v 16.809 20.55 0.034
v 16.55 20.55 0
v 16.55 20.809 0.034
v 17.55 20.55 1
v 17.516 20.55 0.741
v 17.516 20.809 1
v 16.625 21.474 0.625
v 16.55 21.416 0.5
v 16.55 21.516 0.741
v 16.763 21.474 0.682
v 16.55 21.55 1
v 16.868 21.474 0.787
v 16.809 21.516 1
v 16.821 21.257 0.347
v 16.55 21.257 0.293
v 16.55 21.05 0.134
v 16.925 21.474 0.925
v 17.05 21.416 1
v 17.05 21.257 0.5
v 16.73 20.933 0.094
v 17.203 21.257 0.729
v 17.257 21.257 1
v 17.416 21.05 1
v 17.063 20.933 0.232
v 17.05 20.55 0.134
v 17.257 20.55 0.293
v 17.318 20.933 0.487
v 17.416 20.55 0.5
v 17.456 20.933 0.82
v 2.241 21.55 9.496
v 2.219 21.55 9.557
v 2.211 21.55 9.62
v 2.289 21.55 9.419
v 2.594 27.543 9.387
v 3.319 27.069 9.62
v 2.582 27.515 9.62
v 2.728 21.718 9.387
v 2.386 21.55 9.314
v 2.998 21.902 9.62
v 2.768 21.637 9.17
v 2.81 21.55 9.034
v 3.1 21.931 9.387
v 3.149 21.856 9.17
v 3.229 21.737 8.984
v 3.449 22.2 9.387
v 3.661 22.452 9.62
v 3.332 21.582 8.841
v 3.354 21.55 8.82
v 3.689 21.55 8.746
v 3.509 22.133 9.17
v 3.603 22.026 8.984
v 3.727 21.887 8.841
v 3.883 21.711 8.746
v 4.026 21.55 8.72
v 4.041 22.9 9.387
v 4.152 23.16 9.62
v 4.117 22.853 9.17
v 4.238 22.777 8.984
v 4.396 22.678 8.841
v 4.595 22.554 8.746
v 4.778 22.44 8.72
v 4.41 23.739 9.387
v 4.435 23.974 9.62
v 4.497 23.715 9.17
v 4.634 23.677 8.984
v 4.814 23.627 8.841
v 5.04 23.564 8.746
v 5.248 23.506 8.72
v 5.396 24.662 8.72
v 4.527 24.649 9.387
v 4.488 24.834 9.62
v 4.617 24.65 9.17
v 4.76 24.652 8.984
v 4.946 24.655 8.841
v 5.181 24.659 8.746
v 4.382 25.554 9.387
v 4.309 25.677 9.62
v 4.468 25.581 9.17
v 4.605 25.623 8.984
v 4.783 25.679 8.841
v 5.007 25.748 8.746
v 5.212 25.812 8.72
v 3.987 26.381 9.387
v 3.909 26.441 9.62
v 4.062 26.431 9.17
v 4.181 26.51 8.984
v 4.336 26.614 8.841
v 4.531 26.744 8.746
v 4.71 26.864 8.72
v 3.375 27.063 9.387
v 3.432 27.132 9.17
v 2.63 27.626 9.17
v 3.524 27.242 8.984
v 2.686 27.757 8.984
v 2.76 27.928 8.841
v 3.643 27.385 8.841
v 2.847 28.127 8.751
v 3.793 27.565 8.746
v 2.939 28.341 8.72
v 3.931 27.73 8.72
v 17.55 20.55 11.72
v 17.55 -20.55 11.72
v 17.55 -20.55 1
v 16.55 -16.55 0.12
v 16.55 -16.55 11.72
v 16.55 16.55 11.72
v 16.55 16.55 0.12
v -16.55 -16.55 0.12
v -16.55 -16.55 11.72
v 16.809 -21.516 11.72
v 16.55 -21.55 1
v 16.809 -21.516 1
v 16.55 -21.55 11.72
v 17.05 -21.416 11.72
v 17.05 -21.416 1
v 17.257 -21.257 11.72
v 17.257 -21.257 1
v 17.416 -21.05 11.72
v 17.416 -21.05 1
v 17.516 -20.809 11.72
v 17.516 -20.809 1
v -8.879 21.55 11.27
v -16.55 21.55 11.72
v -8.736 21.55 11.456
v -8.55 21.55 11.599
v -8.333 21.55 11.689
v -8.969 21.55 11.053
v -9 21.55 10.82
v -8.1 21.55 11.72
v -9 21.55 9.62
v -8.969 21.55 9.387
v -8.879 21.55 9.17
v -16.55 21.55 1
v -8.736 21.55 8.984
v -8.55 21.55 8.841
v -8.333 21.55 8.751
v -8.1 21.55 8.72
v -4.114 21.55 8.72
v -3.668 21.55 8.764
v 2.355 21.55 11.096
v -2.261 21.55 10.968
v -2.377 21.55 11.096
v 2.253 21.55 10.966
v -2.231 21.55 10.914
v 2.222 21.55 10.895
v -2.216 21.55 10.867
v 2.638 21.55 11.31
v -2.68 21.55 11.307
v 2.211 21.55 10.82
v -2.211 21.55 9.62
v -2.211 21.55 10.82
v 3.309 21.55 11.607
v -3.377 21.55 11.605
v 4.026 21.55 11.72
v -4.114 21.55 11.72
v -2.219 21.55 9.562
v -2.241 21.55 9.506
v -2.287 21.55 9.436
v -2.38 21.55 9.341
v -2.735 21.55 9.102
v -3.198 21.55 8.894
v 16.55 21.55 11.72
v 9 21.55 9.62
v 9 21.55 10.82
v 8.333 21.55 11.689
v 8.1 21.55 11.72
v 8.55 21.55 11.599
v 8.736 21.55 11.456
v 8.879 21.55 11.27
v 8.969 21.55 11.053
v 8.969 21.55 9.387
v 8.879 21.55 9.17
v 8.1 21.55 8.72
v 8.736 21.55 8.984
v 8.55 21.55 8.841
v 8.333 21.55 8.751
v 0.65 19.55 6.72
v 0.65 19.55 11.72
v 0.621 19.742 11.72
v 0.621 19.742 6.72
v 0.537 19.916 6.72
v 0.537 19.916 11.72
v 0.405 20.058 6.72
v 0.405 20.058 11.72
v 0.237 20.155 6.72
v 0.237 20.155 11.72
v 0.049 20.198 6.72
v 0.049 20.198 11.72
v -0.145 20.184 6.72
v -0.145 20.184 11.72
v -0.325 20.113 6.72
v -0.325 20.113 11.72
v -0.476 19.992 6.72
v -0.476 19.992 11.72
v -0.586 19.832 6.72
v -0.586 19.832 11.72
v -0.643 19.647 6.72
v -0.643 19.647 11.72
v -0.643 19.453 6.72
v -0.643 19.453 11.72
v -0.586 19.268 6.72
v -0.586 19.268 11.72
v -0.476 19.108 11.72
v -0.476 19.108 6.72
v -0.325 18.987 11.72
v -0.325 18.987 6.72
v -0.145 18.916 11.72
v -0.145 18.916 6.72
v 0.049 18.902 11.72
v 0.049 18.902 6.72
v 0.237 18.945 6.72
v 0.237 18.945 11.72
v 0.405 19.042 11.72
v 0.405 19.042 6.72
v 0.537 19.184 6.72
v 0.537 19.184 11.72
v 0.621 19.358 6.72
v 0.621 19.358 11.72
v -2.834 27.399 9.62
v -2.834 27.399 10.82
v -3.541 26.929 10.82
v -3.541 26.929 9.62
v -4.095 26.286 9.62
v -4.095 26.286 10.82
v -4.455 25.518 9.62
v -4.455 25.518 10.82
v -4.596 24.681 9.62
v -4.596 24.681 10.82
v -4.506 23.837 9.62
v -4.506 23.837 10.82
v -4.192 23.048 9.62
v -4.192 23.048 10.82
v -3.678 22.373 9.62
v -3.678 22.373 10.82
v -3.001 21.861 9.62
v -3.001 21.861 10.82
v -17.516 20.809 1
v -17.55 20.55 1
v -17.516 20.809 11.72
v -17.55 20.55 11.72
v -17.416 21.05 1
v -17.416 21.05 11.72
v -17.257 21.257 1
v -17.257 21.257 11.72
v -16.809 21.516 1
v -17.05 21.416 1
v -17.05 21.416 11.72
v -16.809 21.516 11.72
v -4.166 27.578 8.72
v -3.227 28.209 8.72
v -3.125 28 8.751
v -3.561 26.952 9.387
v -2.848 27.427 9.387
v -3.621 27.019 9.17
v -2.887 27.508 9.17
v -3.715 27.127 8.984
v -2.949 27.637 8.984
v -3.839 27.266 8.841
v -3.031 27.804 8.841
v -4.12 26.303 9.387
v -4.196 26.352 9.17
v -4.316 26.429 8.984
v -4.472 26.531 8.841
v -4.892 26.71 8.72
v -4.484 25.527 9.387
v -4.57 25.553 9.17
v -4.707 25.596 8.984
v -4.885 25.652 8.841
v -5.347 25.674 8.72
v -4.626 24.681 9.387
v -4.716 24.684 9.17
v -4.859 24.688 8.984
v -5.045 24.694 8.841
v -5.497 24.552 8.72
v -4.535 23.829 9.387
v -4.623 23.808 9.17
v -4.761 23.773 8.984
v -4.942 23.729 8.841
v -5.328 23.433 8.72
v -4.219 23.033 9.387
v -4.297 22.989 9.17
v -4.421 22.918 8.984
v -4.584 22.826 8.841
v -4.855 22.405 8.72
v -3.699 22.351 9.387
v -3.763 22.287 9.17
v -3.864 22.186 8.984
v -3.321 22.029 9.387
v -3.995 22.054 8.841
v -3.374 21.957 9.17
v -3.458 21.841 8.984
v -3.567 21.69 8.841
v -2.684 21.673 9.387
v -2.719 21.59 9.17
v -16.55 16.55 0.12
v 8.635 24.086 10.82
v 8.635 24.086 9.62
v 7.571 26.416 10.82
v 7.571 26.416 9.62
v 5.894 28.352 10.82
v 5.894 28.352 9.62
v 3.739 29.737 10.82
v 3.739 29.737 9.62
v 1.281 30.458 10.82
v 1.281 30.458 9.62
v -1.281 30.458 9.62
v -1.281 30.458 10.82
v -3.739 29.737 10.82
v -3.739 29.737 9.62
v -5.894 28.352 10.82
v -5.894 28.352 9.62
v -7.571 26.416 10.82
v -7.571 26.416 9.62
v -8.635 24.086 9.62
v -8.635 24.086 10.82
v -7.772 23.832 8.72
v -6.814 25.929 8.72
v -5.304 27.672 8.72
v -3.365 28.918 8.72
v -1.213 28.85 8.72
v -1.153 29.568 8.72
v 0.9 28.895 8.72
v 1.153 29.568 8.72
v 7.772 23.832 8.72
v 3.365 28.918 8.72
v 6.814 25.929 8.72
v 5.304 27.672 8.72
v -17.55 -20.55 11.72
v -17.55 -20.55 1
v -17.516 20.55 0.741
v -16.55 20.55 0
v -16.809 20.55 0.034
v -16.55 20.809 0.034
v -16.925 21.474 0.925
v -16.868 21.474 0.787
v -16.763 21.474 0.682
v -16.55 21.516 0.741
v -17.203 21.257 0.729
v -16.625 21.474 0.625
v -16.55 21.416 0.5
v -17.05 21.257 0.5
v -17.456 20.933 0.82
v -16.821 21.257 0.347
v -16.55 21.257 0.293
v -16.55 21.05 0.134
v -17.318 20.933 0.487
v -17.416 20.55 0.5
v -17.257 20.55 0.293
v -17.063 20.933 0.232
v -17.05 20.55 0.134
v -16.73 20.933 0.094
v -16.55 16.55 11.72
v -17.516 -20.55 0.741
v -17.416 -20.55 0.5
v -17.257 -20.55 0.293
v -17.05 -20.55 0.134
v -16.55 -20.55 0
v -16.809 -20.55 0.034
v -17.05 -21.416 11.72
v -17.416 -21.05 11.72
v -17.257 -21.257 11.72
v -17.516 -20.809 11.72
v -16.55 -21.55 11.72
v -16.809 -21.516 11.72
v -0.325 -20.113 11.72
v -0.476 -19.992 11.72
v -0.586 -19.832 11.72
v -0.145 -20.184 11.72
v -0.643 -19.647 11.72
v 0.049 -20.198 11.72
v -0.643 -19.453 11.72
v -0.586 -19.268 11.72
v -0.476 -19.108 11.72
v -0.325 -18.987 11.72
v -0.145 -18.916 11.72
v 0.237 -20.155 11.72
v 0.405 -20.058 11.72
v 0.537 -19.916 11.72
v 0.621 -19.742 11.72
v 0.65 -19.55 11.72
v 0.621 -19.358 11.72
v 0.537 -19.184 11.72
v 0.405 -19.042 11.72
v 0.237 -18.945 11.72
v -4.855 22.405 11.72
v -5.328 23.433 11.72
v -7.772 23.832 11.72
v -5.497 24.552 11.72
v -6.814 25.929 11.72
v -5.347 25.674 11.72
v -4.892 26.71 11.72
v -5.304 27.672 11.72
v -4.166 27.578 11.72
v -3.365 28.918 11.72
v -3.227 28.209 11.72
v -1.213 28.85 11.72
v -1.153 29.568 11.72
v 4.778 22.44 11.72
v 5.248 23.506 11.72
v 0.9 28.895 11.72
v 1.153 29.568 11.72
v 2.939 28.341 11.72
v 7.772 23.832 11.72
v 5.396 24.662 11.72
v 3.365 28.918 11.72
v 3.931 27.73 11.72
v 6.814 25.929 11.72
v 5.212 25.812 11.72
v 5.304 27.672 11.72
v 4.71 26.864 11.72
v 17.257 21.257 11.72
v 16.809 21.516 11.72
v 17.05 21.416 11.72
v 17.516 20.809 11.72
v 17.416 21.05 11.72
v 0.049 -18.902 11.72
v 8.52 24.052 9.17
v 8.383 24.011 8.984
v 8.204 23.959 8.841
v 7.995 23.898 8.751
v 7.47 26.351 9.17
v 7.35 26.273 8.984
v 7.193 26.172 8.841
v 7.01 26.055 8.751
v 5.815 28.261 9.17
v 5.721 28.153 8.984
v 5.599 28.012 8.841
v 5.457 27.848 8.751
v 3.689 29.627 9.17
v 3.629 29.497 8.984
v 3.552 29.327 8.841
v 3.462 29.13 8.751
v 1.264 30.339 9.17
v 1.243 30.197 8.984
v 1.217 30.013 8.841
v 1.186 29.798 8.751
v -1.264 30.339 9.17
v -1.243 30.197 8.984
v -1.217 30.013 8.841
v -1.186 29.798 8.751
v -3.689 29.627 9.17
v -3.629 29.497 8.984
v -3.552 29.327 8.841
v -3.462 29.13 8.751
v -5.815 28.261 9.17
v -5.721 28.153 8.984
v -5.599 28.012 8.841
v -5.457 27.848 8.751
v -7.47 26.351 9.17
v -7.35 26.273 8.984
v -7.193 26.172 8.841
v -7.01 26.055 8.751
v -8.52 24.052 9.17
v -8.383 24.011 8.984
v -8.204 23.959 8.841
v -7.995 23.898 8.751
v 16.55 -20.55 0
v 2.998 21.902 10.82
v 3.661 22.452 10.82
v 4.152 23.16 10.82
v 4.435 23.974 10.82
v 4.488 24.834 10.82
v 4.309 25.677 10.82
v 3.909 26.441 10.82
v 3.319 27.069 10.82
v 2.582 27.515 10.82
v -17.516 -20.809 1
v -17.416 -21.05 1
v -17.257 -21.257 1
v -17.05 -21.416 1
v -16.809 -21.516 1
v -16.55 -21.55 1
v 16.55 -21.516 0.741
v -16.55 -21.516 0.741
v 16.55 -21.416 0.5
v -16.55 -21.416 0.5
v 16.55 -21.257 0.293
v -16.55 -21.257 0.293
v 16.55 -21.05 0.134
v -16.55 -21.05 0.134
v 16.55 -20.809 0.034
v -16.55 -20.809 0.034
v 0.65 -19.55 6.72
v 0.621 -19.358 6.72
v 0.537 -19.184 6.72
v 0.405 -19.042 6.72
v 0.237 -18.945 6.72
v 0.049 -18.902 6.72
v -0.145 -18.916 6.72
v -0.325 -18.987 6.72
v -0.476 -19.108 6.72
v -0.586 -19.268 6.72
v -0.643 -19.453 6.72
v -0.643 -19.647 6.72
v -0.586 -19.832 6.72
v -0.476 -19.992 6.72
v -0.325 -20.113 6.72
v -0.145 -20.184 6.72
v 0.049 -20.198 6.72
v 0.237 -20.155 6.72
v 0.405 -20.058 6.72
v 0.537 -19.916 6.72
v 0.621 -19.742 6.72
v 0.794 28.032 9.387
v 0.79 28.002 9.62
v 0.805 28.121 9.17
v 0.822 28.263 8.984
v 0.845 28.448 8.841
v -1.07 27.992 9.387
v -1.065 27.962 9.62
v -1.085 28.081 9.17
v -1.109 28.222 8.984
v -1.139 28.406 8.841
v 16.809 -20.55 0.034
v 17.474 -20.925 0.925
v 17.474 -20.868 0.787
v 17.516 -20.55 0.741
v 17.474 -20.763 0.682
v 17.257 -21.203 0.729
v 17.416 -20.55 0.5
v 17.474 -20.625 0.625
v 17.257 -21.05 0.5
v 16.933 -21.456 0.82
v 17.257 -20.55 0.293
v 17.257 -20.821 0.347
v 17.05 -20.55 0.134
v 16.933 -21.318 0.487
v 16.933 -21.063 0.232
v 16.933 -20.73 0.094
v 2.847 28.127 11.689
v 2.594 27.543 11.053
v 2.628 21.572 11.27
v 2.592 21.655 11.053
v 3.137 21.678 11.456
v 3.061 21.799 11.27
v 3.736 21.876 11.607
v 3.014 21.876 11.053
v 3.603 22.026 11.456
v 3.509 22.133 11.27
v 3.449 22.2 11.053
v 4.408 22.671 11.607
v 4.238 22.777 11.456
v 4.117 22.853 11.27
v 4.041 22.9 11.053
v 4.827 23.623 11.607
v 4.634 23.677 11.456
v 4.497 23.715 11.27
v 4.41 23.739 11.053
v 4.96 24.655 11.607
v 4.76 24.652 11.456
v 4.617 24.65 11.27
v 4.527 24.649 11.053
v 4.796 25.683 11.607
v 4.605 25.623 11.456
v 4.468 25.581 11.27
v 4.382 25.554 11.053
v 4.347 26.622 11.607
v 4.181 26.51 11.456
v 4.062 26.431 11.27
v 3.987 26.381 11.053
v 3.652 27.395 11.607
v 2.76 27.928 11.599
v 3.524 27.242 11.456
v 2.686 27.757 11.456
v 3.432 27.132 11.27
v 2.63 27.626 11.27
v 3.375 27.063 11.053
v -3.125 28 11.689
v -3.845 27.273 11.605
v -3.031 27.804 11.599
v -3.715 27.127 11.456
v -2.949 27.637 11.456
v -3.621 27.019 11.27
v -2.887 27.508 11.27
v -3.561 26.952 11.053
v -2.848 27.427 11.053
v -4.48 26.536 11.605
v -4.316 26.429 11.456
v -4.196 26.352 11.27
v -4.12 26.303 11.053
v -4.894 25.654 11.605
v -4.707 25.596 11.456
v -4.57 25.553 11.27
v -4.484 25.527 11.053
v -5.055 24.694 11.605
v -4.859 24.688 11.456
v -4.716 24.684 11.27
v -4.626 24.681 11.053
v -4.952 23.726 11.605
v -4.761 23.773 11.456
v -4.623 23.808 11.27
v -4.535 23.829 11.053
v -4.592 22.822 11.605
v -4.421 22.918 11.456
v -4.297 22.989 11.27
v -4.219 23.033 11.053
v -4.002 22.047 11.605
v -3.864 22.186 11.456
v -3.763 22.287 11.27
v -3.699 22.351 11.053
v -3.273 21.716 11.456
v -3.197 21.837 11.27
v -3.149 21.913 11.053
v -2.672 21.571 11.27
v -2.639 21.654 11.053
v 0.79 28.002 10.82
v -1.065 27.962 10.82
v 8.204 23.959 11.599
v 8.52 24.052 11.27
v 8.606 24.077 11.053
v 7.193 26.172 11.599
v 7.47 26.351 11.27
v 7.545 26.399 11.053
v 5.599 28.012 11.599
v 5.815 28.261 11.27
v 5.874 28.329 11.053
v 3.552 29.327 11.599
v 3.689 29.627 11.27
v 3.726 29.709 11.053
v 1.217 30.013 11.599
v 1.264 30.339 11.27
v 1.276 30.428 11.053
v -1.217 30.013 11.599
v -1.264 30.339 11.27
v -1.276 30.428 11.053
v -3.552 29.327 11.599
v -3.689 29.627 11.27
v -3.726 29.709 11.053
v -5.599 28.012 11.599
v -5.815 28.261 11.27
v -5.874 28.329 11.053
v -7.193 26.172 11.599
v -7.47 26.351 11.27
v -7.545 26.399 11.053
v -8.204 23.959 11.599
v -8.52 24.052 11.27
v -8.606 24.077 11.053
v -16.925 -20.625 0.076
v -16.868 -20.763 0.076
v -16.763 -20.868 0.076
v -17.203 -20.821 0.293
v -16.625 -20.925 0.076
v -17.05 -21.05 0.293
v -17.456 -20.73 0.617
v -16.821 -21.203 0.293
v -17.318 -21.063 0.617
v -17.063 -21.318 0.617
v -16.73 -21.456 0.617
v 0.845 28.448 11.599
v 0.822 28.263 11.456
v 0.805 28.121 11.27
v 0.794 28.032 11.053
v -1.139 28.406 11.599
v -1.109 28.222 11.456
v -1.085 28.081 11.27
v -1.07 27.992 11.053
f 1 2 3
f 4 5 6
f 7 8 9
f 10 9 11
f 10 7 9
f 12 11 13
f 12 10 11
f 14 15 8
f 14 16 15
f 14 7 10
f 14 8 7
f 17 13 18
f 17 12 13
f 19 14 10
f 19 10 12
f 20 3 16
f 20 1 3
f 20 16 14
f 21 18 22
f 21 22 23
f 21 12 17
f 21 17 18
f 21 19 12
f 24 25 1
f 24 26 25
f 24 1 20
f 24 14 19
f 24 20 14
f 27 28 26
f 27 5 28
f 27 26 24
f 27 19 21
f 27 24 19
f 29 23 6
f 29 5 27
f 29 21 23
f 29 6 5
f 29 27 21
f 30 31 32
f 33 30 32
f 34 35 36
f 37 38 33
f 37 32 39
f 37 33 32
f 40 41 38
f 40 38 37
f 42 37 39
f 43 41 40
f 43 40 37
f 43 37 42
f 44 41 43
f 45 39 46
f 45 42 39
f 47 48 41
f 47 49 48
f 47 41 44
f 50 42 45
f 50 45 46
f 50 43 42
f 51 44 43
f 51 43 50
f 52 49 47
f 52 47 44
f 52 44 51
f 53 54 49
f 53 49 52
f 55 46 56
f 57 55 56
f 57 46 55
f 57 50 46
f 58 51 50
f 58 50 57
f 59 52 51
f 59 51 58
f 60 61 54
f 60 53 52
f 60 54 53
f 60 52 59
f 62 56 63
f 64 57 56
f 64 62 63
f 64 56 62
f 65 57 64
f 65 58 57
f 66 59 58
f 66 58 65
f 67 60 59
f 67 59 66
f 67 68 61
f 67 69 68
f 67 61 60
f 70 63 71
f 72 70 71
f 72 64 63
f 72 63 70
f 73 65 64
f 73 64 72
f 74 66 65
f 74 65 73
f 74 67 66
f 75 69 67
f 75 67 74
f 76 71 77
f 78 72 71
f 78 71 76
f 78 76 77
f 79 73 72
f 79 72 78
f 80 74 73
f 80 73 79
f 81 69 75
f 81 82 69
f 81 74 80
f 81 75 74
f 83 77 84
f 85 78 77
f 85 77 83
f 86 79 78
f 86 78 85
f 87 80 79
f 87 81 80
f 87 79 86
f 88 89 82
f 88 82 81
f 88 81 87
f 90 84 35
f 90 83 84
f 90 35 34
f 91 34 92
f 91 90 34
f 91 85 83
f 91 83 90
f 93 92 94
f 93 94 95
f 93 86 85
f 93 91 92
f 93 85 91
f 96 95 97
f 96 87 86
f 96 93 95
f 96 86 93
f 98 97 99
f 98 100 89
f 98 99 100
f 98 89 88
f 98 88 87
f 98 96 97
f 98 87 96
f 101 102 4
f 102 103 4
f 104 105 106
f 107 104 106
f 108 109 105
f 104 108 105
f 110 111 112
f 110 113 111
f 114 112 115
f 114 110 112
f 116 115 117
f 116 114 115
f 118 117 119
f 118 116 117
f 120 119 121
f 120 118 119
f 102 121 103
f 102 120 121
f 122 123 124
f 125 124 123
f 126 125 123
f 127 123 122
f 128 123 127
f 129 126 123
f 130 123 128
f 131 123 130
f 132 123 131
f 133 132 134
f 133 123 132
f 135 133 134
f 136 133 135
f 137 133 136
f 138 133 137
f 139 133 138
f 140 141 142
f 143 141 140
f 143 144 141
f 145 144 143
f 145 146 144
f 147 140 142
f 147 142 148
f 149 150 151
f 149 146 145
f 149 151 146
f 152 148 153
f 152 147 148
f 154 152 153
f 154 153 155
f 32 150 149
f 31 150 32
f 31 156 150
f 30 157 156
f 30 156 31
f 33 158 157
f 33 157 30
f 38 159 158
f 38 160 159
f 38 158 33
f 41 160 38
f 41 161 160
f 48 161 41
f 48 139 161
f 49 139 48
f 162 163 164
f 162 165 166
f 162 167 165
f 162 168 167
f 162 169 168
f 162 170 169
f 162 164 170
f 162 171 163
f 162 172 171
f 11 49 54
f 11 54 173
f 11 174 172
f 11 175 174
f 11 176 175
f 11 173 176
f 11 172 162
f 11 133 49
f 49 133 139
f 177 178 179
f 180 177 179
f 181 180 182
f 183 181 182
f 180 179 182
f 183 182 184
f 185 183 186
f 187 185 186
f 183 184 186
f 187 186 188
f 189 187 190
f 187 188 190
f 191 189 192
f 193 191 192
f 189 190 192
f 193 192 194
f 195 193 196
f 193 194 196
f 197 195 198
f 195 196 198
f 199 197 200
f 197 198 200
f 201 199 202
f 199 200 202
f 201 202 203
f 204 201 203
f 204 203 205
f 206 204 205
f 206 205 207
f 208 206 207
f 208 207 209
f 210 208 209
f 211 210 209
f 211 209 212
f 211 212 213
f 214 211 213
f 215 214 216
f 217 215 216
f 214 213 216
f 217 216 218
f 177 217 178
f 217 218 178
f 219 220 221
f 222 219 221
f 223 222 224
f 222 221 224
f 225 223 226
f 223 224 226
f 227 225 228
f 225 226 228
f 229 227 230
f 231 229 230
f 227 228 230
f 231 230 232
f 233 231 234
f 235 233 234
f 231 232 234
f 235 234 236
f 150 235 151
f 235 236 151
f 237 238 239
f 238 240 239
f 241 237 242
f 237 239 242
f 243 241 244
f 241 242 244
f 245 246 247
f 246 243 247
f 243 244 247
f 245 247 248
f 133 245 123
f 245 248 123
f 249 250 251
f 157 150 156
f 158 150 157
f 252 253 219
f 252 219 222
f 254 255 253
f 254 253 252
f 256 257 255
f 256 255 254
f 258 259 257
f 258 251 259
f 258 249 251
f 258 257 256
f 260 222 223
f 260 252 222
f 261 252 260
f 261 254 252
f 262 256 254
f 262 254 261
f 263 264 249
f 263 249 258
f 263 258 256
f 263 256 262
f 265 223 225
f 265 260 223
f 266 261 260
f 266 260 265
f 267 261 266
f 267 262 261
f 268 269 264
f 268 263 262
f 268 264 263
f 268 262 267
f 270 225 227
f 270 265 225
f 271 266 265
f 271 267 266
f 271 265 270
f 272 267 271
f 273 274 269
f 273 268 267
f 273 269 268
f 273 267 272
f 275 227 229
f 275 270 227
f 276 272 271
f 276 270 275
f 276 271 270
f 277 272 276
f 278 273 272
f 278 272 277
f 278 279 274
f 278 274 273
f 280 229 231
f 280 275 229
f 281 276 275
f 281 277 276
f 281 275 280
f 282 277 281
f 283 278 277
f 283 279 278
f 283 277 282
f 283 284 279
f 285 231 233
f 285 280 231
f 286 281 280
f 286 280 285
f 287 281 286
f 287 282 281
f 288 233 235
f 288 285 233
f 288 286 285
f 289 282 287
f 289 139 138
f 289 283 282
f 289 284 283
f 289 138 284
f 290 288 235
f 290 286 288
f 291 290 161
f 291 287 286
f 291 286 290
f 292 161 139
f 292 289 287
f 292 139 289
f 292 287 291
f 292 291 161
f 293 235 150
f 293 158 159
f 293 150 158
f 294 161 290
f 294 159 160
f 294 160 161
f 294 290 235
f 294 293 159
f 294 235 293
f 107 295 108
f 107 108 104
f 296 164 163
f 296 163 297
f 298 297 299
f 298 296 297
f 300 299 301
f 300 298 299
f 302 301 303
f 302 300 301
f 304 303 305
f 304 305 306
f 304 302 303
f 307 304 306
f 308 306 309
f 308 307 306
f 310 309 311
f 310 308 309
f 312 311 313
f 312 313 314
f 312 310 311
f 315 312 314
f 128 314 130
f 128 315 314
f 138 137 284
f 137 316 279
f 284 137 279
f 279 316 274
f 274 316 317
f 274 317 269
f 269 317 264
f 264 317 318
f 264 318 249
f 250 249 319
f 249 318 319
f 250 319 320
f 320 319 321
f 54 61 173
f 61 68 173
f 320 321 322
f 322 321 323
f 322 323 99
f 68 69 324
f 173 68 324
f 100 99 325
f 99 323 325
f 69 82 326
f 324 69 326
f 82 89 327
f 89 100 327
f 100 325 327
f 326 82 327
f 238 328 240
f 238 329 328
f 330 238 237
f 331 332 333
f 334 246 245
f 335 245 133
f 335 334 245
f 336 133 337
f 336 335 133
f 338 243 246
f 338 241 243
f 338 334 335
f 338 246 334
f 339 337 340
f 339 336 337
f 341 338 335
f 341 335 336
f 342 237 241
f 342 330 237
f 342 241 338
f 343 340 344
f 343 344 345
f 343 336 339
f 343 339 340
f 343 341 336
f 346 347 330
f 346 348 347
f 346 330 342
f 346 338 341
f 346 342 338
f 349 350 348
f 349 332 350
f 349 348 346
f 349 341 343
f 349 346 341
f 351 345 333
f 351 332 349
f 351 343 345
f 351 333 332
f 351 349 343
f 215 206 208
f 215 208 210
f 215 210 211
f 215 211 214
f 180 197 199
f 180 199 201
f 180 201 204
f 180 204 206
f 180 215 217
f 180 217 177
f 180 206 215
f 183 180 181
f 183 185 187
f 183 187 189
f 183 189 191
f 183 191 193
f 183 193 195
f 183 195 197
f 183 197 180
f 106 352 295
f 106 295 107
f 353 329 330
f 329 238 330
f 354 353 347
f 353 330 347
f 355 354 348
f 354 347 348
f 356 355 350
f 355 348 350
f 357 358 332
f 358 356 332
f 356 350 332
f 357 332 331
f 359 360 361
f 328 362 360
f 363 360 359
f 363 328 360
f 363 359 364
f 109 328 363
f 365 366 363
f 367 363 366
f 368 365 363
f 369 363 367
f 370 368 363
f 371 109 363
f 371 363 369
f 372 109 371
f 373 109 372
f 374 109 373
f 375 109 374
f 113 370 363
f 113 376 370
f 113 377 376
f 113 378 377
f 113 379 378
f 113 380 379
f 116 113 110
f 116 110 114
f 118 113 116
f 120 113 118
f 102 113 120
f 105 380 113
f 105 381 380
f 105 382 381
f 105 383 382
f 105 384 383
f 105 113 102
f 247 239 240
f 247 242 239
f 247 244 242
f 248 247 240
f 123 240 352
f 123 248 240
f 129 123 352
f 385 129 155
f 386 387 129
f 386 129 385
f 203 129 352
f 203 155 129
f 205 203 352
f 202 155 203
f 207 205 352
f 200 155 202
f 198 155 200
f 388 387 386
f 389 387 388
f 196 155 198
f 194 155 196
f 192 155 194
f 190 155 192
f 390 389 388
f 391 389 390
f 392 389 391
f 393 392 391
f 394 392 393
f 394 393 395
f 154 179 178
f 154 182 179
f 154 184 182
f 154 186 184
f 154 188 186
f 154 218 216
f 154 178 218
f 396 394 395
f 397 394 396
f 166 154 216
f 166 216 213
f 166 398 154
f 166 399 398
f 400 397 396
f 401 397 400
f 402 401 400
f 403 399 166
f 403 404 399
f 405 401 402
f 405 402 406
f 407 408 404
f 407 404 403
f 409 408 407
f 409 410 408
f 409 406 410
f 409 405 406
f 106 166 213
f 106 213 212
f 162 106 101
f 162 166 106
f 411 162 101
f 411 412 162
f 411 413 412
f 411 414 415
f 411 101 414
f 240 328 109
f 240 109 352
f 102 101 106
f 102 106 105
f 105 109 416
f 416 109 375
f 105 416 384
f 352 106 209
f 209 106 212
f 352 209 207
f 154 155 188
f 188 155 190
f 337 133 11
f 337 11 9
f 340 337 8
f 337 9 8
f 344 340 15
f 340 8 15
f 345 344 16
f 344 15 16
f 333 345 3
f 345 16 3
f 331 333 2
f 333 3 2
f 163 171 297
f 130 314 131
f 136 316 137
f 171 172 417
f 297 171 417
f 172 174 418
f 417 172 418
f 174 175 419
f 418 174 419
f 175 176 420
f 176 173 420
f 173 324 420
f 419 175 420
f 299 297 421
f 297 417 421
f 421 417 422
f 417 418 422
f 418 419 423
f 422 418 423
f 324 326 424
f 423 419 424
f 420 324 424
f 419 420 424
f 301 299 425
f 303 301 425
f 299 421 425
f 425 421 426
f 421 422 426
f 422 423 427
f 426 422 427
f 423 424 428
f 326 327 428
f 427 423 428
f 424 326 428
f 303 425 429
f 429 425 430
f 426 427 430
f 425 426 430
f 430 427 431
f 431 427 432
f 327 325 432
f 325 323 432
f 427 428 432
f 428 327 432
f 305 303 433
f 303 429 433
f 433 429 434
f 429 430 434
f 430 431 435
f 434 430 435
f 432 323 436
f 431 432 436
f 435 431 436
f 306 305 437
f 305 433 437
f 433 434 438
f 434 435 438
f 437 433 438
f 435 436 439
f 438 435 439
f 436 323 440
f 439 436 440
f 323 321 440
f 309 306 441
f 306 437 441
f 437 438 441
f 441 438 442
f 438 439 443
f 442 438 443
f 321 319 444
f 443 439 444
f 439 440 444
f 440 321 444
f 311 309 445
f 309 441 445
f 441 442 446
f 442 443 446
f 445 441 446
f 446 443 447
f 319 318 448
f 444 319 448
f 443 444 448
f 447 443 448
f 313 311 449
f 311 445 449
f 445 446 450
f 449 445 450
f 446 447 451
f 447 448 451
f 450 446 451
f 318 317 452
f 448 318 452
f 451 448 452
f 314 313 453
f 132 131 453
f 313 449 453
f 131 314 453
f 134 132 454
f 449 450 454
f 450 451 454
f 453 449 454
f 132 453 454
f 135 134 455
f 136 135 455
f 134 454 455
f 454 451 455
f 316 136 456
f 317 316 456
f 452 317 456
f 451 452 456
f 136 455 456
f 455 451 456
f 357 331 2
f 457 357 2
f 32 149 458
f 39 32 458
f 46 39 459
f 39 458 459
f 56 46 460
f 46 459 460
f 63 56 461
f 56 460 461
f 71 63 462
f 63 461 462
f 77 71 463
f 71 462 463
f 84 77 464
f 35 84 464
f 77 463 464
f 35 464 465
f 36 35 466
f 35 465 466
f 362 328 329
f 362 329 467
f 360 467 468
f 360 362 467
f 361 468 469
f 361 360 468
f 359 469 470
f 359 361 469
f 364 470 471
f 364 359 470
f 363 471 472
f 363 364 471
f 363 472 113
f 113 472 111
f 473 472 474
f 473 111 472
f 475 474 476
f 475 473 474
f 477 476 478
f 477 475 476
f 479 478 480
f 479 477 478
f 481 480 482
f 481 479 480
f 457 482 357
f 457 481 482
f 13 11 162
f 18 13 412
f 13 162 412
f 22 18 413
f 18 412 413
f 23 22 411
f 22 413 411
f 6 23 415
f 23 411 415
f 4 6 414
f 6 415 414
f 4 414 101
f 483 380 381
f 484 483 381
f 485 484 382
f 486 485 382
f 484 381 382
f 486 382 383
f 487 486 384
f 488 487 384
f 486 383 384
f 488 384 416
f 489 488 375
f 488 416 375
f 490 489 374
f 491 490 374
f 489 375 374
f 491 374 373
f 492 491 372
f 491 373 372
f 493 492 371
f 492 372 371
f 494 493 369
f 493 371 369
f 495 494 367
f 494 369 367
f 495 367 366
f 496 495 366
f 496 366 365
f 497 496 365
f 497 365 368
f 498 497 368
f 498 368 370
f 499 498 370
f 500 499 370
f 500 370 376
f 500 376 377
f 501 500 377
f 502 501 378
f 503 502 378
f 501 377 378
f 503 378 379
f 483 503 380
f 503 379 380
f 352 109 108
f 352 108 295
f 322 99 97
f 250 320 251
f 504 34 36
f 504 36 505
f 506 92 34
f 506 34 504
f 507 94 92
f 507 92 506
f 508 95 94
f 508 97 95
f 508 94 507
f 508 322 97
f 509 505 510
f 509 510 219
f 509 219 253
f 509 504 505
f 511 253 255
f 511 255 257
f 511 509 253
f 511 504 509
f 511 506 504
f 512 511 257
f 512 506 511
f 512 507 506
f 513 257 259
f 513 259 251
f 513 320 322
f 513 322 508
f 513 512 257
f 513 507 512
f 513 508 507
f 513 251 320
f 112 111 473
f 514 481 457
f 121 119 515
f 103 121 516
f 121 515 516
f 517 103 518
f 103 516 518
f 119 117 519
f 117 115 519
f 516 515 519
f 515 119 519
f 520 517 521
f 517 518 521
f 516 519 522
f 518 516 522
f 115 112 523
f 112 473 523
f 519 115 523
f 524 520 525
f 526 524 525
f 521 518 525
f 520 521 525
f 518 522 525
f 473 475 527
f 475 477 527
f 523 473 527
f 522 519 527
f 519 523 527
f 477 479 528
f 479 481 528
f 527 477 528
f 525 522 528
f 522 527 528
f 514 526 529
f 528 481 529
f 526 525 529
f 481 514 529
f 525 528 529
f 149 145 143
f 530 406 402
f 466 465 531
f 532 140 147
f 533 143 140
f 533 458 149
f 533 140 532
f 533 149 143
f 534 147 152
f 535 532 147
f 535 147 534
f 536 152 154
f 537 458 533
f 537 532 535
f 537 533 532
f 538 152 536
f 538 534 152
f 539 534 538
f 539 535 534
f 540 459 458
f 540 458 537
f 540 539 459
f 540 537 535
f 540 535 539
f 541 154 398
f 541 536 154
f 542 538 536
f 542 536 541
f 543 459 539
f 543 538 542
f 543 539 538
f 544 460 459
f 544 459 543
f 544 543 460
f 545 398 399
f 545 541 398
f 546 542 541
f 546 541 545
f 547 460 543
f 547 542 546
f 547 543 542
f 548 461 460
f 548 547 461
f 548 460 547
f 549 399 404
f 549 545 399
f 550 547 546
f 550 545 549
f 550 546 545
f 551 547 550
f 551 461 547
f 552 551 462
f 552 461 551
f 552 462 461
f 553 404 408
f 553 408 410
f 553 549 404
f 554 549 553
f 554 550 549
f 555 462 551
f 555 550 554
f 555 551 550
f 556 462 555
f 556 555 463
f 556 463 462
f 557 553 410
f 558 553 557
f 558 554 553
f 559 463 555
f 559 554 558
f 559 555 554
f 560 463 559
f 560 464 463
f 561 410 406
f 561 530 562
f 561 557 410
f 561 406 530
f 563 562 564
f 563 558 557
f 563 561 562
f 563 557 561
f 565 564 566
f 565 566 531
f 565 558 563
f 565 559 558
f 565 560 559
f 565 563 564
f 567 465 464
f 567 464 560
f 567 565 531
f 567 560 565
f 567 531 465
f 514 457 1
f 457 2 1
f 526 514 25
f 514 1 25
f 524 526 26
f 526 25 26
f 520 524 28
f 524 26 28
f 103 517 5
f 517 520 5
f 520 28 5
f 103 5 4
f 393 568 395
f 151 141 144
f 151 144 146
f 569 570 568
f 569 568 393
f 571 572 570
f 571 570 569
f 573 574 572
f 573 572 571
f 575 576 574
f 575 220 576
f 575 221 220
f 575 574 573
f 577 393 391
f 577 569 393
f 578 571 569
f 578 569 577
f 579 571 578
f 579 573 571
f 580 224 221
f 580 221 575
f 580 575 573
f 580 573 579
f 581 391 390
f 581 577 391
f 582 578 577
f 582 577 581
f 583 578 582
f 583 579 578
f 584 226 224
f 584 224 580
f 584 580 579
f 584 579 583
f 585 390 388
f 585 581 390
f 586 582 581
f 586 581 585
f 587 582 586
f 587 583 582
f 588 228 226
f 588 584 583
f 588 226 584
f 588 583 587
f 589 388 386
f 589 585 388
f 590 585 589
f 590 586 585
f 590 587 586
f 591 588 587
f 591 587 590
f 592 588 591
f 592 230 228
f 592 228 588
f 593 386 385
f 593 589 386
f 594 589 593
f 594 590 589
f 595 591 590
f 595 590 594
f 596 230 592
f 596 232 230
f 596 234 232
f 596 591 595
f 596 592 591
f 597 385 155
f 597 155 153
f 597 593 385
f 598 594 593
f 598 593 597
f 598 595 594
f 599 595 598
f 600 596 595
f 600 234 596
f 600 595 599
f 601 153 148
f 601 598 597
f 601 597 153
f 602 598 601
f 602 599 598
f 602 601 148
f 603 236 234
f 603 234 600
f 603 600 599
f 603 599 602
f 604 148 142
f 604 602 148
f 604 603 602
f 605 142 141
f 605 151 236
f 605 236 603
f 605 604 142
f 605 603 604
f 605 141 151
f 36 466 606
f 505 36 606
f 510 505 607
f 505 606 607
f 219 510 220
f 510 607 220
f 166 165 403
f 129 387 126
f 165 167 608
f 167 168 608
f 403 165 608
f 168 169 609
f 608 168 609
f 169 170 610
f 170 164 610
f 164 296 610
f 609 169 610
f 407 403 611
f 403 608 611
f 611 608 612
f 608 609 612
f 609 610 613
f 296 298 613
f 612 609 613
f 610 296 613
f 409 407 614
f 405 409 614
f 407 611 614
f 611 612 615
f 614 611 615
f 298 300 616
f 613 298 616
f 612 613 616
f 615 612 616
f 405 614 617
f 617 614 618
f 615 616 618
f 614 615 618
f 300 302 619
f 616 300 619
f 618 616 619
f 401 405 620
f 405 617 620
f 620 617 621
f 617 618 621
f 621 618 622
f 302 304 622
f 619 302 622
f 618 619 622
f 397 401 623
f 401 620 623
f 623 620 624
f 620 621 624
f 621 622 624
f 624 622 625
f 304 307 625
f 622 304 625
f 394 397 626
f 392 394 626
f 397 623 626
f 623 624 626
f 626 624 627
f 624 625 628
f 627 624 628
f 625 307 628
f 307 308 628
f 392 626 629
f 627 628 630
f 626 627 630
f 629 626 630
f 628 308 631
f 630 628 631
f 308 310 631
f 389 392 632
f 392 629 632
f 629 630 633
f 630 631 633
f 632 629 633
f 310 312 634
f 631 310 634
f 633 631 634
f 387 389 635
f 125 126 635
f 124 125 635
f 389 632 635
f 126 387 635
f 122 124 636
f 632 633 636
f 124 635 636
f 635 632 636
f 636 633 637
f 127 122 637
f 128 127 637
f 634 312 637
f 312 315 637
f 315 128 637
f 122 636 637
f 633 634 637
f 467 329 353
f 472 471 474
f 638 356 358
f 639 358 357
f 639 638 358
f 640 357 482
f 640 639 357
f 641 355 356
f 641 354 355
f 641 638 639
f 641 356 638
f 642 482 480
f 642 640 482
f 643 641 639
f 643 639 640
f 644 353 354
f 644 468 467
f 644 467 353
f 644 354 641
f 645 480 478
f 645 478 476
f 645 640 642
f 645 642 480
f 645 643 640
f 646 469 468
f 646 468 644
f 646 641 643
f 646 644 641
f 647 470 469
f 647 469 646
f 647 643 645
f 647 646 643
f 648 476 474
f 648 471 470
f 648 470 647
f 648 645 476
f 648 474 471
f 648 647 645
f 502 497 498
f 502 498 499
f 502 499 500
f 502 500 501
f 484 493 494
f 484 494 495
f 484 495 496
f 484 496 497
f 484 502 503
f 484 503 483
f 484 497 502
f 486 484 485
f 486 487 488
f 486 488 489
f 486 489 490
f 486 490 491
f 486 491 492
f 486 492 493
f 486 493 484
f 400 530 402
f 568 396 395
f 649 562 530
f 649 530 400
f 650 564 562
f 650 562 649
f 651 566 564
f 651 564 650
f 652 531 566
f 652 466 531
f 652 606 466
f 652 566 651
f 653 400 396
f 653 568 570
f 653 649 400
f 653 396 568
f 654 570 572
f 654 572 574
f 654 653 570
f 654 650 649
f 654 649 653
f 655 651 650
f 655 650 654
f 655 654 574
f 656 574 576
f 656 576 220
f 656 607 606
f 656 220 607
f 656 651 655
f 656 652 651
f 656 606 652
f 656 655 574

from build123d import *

# Parameters (mm, degrees)
SKETCH_W        = 35.1
SKETCH_H        = 43.1
PAD_DEPTH       = 11.72
SKETCH002_W     = 33.1
SKETCH002_H     = 33.1
POCKET_DEPTH    = 11.6
SKETCH006_R     = 0.65
POCKET004_DEPTH = 5
PAD002_DEPTH    = 3
FILLET_R        = 1
FILLET002_R     = 0.9


with BuildPart() as part:
    # Sketch → Pad (new body)
    with BuildSketch(Plane.XY):
        Rectangle(SKETCH_W, SKETCH_H)
    extrude(amount=PAD_DEPTH)

    # Sketch002 (on Face6 of Pad) → Pocket (cut)
    with BuildSketch(Plane.XY.offset(11.72)):
        Rectangle(SKETCH002_W, SKETCH002_H)
    extrude(amount=-POCKET_DEPTH, mode=Mode.SUBTRACT)

    # Sketch006 (on Face5 of Pocket) → Pocket004 (cut)
    with BuildSketch(Plane.XY.offset(11.72)):
        with Locations((0, 19.55)):
            Circle(SKETCH006_R)
        with Locations((0, -19.55)):
            Circle(SKETCH006_R)
    extrude(amount=-POCKET004_DEPTH, mode=Mode.SUBTRACT)

    # Sketch008 (on Face5 of Pocket004) → Pad002 (join)
    with BuildSketch(Plane.XY.offset(11.72)):
        with BuildLine():
            ThreePointArc((9, 21.55), (0, 30.55), (-9, 21.55))
            Line((-2.210805, 21.55), (-9, 21.55))
            ThreePointArc((-2.834383, 27.399468), (-4.579363, 24.255474), (-2.210805, 21.55))
            ThreePointArc((2.58169, 27.515306), (-0.138989, 28.048514), (-2.834383, 27.399468))
            ThreePointArc((2.210805, 21.55), (4.490762, 24.40243), (2.58169, 27.515306))
            Line((9, 21.55), (2.210805, 21.55))
        make_face()
    extrude(amount=-PAD002_DEPTH)

    # Fillet
    fillet_edges = [part.edges().sort_by_distance(p)[0] for p in [
        (-17.55, -21.55, 5.86),
        (-17.55, 0, 0),
        (0, -21.55, 0),
        (17.55, -21.55, 5.86),
        (17.55, 0, 0),
        (-17.55, 21.55, 5.86),
        (0, 21.55, 0),
        (17.55, 21.55, 5.86),
    ]]
    fillet(fillet_edges, radius=FILLET_R)

    # Fillet002
    fillet002_edges = [part.edges().sort_by_distance(p)[0] for p in [
        (0, 30.55, 11.72),
        (0, 30.55, 8.72),
        (-4.579363, 24.255474, 8.72),
        (-0.138989, 28.048514, 8.72),
        (4.490762, 24.40243, 8.72),
        (-4.579363, 24.255474, 11.72),
        (-0.138989, 28.048514, 11.72),
        (4.490762, 24.40243, 11.72),
    ]]
    fillet(fillet002_edges, radius=FILLET002_R)


solid = part.part
